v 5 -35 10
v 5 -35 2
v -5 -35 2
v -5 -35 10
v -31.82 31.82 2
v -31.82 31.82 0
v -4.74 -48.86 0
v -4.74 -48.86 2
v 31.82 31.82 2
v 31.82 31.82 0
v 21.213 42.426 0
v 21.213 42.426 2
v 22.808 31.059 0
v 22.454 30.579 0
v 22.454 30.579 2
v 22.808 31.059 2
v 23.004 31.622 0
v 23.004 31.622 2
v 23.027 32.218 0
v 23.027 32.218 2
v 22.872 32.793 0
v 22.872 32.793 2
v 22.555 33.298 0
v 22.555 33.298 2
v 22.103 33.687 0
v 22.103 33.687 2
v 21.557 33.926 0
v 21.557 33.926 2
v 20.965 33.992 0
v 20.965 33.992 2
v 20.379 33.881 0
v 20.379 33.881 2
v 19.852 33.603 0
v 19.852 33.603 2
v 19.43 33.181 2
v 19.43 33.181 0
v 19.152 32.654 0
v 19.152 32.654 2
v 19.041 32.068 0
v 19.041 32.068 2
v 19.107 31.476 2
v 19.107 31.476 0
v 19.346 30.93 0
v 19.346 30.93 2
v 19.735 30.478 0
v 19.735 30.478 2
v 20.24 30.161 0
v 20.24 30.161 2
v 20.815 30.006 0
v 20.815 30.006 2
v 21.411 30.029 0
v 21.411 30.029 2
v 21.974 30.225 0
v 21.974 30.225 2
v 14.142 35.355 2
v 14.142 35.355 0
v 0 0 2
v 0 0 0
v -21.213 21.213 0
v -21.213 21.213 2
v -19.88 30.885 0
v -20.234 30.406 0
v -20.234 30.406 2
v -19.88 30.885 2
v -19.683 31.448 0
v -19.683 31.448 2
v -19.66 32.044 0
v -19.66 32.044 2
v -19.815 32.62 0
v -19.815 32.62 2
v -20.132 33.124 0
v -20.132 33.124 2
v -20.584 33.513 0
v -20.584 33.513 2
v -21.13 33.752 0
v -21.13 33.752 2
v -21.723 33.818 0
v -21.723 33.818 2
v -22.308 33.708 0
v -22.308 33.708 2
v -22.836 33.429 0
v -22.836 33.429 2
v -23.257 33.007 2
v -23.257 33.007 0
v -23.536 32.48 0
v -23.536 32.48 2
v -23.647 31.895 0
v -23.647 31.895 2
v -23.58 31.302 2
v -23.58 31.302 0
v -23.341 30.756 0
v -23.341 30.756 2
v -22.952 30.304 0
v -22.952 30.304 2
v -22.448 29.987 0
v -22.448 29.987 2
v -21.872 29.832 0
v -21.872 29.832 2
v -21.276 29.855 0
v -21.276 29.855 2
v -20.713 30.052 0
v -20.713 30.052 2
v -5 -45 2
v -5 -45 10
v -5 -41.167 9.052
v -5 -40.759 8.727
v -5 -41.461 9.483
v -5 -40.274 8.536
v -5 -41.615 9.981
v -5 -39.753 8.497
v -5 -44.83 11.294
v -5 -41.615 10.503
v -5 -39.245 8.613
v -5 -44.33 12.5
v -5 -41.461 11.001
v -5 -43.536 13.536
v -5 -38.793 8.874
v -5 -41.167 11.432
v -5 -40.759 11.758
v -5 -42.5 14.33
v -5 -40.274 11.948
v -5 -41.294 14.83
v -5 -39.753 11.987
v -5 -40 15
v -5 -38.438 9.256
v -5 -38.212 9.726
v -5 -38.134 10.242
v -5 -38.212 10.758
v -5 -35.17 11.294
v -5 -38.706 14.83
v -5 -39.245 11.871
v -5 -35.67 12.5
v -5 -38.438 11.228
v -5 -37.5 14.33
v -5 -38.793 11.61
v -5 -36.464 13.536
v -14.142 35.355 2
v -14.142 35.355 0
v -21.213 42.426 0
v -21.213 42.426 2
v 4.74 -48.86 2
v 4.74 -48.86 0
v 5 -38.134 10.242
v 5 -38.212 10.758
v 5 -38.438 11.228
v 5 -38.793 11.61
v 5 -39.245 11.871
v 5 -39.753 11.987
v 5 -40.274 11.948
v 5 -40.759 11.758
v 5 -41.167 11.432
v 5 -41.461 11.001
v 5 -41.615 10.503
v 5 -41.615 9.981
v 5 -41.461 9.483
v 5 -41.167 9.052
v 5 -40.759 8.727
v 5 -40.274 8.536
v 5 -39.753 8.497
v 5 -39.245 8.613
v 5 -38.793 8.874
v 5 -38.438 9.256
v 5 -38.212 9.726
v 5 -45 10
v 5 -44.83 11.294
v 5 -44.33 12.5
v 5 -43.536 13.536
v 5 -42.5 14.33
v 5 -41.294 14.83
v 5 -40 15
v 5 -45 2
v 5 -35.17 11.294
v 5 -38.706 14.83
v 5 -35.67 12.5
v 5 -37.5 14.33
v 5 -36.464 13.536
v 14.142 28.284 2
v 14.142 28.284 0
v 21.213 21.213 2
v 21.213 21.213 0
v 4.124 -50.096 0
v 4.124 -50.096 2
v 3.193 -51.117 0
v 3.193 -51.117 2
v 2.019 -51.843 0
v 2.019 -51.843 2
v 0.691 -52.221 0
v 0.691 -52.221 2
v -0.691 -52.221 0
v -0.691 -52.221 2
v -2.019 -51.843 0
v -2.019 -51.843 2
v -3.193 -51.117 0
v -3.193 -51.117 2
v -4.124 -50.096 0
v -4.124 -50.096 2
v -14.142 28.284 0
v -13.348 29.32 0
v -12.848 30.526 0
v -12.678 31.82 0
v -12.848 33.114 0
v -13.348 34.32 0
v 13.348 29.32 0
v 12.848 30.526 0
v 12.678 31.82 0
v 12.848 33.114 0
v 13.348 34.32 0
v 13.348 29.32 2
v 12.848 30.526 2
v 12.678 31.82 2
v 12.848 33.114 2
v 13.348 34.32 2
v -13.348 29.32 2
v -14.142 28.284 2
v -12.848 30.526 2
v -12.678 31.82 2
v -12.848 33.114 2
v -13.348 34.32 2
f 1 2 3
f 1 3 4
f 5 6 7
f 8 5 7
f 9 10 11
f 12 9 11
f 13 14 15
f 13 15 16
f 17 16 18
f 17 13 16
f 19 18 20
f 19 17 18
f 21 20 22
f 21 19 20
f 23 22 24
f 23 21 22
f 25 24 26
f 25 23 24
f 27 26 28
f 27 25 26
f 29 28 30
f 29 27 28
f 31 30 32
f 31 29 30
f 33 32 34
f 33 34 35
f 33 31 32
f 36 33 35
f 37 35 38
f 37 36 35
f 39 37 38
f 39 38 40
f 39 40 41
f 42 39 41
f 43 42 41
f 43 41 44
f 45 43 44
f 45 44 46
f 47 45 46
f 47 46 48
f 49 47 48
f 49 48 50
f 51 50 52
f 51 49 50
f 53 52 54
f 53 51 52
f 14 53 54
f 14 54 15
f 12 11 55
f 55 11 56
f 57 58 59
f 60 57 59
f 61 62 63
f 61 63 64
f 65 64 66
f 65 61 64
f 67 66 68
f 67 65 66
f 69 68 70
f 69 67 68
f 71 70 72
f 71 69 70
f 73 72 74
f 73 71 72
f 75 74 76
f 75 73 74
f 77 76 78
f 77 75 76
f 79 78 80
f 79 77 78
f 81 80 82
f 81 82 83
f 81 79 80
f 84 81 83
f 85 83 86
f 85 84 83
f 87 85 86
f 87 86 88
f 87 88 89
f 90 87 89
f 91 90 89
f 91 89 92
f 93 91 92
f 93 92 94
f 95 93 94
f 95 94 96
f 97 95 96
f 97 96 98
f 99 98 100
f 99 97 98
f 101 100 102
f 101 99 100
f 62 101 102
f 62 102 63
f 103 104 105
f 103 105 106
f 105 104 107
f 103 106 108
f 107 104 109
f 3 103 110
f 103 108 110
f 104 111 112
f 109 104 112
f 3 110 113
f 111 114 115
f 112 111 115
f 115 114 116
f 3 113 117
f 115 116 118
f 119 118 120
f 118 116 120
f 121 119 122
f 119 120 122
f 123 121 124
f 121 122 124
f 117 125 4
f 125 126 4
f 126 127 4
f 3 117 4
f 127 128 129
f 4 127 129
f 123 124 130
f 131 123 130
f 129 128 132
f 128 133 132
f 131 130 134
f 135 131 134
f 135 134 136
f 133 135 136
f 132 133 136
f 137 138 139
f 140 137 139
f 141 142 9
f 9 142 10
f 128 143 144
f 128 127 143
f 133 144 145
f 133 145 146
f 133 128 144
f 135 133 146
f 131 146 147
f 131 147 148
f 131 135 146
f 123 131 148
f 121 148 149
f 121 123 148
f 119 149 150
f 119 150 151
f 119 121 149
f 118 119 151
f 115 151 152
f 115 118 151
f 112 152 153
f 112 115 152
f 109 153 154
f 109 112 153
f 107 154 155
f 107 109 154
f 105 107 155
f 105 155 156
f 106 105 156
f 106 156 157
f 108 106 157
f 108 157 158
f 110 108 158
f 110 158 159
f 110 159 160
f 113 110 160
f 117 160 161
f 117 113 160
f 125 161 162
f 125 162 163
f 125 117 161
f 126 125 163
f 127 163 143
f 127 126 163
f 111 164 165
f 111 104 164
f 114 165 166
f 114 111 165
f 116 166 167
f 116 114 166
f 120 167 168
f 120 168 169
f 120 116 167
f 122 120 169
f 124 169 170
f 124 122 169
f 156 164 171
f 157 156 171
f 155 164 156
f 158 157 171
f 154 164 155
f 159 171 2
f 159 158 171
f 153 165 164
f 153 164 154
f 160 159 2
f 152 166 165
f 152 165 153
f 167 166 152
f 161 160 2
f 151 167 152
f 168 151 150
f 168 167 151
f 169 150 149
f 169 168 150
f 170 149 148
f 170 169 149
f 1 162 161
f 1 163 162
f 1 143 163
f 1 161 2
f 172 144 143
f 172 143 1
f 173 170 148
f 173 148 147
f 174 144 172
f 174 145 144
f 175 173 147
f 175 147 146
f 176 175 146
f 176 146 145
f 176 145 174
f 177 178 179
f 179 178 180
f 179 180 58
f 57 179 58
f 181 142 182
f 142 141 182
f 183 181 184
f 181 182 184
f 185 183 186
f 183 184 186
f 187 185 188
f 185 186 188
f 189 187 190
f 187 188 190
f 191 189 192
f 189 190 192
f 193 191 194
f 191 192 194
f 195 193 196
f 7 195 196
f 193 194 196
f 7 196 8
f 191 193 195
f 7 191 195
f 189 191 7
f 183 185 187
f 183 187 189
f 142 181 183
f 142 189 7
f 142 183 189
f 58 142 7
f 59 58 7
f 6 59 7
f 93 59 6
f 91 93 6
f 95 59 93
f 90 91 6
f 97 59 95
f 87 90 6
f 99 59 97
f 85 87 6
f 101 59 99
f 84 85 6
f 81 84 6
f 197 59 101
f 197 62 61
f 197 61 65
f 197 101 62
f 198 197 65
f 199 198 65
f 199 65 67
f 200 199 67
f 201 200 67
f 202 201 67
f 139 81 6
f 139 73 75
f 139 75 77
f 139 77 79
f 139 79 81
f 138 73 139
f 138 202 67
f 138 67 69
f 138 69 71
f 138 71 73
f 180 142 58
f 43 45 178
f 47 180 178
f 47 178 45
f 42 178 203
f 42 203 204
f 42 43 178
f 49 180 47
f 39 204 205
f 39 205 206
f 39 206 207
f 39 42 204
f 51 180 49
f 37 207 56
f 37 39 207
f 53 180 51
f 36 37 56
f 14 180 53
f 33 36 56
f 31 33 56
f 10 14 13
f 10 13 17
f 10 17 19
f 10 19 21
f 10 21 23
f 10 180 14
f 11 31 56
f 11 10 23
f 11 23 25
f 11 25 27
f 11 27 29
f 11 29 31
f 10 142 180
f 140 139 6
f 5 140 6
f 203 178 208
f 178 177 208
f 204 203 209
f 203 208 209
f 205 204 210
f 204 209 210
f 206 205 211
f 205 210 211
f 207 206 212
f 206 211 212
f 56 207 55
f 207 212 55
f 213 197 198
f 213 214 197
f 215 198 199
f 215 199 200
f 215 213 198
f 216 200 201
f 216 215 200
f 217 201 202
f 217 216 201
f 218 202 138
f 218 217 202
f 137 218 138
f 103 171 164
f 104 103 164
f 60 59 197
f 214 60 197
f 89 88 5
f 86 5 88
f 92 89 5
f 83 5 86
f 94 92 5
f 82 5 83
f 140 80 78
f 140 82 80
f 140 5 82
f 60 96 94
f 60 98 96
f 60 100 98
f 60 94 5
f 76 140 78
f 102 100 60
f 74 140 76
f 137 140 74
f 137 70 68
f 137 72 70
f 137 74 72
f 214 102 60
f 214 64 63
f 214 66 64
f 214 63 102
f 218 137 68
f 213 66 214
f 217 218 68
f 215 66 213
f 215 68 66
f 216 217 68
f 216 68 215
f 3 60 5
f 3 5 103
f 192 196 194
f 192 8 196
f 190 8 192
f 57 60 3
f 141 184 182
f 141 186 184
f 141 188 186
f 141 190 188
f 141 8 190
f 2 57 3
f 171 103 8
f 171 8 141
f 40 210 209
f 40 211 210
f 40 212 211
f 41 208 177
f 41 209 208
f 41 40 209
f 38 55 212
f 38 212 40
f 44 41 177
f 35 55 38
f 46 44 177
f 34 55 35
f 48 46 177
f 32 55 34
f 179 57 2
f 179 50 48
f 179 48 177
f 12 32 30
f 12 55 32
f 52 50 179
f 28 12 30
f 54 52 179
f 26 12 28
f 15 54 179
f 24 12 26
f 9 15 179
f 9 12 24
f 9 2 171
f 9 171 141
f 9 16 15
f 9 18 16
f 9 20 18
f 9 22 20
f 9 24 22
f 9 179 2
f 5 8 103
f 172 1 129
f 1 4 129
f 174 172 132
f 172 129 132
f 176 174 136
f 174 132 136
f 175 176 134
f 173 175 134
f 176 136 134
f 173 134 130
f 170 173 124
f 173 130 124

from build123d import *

# Parameters (mm, degrees)
F0_R     = 2
F1_DEPTH = 2
F2_ANGLE = 45
F3_W     = 10
F3_H     = 15
F3_R     = 1.75
F4_DEPTH = 5
F5_R     = 4.99999
F6_R     = 5


# Not quite as in the source:
# - a fillet or chamfer is up to 0.001 mm smaller than in the source, because OpenCascade refuses the exact size


with BuildPart() as f1:
    # F0 (on Top) → F1 (new body)
    with BuildSketch(Plane.XY):
        Polygon((0, 0), (-30, 0), (-30, 15), (-45, 15), (-45, 0), (44.535438389, -44.535438389), (0, 45), (-15, 45), (-15, 30), (0, 30), align=None)
        with Locations((-37.8073789179, 7.1926233359)):
            Circle(F0_R, mode=Mode.SUBTRACT)
        with Locations((-7.745902054, 37.5)):
            Circle(F0_R, mode=Mode.SUBTRACT)
    extrude(amount=F1_DEPTH)


with BuildPart() as f1_1:
    # F2: moved
    add(f1.part.rotate(Axis((0, 0, 1), (0, 0, -1)), F2_ANGLE))

    # F3 (on Right) → F4 (join, symmetric)
    with BuildSketch(Plane.YZ):
        with Locations((-40, 7.5)):
            Rectangle(F3_W, F3_H)
        with Locations((-39.8841314018, 10.2421231568)):
            Circle(F3_R, mode=Mode.SUBTRACT)
    extrude(amount=F4_DEPTH, both=True)

    # F5 (radius 5 in the source; OpenCascade refuses exactly that, so slightly less here)
    f5_edges = [f1_1.edges().sort_by_distance(p)[0] for p in [
        (0, -45, 15),
        (0, -35, 15),
        (10.606602, 31.819805, 1),
        (-10.606602, 31.819805, 1),
    ]]
    fillet(f5_edges, radius=F5_R)

    # F6
    f6_edges = [f1_1.edges().sort_by_distance(p)[0] for p in [
        (0, -62.982621, 1),
    ]]
    fillet(f6_edges, radius=F6_R)


solid = f1_1.part
